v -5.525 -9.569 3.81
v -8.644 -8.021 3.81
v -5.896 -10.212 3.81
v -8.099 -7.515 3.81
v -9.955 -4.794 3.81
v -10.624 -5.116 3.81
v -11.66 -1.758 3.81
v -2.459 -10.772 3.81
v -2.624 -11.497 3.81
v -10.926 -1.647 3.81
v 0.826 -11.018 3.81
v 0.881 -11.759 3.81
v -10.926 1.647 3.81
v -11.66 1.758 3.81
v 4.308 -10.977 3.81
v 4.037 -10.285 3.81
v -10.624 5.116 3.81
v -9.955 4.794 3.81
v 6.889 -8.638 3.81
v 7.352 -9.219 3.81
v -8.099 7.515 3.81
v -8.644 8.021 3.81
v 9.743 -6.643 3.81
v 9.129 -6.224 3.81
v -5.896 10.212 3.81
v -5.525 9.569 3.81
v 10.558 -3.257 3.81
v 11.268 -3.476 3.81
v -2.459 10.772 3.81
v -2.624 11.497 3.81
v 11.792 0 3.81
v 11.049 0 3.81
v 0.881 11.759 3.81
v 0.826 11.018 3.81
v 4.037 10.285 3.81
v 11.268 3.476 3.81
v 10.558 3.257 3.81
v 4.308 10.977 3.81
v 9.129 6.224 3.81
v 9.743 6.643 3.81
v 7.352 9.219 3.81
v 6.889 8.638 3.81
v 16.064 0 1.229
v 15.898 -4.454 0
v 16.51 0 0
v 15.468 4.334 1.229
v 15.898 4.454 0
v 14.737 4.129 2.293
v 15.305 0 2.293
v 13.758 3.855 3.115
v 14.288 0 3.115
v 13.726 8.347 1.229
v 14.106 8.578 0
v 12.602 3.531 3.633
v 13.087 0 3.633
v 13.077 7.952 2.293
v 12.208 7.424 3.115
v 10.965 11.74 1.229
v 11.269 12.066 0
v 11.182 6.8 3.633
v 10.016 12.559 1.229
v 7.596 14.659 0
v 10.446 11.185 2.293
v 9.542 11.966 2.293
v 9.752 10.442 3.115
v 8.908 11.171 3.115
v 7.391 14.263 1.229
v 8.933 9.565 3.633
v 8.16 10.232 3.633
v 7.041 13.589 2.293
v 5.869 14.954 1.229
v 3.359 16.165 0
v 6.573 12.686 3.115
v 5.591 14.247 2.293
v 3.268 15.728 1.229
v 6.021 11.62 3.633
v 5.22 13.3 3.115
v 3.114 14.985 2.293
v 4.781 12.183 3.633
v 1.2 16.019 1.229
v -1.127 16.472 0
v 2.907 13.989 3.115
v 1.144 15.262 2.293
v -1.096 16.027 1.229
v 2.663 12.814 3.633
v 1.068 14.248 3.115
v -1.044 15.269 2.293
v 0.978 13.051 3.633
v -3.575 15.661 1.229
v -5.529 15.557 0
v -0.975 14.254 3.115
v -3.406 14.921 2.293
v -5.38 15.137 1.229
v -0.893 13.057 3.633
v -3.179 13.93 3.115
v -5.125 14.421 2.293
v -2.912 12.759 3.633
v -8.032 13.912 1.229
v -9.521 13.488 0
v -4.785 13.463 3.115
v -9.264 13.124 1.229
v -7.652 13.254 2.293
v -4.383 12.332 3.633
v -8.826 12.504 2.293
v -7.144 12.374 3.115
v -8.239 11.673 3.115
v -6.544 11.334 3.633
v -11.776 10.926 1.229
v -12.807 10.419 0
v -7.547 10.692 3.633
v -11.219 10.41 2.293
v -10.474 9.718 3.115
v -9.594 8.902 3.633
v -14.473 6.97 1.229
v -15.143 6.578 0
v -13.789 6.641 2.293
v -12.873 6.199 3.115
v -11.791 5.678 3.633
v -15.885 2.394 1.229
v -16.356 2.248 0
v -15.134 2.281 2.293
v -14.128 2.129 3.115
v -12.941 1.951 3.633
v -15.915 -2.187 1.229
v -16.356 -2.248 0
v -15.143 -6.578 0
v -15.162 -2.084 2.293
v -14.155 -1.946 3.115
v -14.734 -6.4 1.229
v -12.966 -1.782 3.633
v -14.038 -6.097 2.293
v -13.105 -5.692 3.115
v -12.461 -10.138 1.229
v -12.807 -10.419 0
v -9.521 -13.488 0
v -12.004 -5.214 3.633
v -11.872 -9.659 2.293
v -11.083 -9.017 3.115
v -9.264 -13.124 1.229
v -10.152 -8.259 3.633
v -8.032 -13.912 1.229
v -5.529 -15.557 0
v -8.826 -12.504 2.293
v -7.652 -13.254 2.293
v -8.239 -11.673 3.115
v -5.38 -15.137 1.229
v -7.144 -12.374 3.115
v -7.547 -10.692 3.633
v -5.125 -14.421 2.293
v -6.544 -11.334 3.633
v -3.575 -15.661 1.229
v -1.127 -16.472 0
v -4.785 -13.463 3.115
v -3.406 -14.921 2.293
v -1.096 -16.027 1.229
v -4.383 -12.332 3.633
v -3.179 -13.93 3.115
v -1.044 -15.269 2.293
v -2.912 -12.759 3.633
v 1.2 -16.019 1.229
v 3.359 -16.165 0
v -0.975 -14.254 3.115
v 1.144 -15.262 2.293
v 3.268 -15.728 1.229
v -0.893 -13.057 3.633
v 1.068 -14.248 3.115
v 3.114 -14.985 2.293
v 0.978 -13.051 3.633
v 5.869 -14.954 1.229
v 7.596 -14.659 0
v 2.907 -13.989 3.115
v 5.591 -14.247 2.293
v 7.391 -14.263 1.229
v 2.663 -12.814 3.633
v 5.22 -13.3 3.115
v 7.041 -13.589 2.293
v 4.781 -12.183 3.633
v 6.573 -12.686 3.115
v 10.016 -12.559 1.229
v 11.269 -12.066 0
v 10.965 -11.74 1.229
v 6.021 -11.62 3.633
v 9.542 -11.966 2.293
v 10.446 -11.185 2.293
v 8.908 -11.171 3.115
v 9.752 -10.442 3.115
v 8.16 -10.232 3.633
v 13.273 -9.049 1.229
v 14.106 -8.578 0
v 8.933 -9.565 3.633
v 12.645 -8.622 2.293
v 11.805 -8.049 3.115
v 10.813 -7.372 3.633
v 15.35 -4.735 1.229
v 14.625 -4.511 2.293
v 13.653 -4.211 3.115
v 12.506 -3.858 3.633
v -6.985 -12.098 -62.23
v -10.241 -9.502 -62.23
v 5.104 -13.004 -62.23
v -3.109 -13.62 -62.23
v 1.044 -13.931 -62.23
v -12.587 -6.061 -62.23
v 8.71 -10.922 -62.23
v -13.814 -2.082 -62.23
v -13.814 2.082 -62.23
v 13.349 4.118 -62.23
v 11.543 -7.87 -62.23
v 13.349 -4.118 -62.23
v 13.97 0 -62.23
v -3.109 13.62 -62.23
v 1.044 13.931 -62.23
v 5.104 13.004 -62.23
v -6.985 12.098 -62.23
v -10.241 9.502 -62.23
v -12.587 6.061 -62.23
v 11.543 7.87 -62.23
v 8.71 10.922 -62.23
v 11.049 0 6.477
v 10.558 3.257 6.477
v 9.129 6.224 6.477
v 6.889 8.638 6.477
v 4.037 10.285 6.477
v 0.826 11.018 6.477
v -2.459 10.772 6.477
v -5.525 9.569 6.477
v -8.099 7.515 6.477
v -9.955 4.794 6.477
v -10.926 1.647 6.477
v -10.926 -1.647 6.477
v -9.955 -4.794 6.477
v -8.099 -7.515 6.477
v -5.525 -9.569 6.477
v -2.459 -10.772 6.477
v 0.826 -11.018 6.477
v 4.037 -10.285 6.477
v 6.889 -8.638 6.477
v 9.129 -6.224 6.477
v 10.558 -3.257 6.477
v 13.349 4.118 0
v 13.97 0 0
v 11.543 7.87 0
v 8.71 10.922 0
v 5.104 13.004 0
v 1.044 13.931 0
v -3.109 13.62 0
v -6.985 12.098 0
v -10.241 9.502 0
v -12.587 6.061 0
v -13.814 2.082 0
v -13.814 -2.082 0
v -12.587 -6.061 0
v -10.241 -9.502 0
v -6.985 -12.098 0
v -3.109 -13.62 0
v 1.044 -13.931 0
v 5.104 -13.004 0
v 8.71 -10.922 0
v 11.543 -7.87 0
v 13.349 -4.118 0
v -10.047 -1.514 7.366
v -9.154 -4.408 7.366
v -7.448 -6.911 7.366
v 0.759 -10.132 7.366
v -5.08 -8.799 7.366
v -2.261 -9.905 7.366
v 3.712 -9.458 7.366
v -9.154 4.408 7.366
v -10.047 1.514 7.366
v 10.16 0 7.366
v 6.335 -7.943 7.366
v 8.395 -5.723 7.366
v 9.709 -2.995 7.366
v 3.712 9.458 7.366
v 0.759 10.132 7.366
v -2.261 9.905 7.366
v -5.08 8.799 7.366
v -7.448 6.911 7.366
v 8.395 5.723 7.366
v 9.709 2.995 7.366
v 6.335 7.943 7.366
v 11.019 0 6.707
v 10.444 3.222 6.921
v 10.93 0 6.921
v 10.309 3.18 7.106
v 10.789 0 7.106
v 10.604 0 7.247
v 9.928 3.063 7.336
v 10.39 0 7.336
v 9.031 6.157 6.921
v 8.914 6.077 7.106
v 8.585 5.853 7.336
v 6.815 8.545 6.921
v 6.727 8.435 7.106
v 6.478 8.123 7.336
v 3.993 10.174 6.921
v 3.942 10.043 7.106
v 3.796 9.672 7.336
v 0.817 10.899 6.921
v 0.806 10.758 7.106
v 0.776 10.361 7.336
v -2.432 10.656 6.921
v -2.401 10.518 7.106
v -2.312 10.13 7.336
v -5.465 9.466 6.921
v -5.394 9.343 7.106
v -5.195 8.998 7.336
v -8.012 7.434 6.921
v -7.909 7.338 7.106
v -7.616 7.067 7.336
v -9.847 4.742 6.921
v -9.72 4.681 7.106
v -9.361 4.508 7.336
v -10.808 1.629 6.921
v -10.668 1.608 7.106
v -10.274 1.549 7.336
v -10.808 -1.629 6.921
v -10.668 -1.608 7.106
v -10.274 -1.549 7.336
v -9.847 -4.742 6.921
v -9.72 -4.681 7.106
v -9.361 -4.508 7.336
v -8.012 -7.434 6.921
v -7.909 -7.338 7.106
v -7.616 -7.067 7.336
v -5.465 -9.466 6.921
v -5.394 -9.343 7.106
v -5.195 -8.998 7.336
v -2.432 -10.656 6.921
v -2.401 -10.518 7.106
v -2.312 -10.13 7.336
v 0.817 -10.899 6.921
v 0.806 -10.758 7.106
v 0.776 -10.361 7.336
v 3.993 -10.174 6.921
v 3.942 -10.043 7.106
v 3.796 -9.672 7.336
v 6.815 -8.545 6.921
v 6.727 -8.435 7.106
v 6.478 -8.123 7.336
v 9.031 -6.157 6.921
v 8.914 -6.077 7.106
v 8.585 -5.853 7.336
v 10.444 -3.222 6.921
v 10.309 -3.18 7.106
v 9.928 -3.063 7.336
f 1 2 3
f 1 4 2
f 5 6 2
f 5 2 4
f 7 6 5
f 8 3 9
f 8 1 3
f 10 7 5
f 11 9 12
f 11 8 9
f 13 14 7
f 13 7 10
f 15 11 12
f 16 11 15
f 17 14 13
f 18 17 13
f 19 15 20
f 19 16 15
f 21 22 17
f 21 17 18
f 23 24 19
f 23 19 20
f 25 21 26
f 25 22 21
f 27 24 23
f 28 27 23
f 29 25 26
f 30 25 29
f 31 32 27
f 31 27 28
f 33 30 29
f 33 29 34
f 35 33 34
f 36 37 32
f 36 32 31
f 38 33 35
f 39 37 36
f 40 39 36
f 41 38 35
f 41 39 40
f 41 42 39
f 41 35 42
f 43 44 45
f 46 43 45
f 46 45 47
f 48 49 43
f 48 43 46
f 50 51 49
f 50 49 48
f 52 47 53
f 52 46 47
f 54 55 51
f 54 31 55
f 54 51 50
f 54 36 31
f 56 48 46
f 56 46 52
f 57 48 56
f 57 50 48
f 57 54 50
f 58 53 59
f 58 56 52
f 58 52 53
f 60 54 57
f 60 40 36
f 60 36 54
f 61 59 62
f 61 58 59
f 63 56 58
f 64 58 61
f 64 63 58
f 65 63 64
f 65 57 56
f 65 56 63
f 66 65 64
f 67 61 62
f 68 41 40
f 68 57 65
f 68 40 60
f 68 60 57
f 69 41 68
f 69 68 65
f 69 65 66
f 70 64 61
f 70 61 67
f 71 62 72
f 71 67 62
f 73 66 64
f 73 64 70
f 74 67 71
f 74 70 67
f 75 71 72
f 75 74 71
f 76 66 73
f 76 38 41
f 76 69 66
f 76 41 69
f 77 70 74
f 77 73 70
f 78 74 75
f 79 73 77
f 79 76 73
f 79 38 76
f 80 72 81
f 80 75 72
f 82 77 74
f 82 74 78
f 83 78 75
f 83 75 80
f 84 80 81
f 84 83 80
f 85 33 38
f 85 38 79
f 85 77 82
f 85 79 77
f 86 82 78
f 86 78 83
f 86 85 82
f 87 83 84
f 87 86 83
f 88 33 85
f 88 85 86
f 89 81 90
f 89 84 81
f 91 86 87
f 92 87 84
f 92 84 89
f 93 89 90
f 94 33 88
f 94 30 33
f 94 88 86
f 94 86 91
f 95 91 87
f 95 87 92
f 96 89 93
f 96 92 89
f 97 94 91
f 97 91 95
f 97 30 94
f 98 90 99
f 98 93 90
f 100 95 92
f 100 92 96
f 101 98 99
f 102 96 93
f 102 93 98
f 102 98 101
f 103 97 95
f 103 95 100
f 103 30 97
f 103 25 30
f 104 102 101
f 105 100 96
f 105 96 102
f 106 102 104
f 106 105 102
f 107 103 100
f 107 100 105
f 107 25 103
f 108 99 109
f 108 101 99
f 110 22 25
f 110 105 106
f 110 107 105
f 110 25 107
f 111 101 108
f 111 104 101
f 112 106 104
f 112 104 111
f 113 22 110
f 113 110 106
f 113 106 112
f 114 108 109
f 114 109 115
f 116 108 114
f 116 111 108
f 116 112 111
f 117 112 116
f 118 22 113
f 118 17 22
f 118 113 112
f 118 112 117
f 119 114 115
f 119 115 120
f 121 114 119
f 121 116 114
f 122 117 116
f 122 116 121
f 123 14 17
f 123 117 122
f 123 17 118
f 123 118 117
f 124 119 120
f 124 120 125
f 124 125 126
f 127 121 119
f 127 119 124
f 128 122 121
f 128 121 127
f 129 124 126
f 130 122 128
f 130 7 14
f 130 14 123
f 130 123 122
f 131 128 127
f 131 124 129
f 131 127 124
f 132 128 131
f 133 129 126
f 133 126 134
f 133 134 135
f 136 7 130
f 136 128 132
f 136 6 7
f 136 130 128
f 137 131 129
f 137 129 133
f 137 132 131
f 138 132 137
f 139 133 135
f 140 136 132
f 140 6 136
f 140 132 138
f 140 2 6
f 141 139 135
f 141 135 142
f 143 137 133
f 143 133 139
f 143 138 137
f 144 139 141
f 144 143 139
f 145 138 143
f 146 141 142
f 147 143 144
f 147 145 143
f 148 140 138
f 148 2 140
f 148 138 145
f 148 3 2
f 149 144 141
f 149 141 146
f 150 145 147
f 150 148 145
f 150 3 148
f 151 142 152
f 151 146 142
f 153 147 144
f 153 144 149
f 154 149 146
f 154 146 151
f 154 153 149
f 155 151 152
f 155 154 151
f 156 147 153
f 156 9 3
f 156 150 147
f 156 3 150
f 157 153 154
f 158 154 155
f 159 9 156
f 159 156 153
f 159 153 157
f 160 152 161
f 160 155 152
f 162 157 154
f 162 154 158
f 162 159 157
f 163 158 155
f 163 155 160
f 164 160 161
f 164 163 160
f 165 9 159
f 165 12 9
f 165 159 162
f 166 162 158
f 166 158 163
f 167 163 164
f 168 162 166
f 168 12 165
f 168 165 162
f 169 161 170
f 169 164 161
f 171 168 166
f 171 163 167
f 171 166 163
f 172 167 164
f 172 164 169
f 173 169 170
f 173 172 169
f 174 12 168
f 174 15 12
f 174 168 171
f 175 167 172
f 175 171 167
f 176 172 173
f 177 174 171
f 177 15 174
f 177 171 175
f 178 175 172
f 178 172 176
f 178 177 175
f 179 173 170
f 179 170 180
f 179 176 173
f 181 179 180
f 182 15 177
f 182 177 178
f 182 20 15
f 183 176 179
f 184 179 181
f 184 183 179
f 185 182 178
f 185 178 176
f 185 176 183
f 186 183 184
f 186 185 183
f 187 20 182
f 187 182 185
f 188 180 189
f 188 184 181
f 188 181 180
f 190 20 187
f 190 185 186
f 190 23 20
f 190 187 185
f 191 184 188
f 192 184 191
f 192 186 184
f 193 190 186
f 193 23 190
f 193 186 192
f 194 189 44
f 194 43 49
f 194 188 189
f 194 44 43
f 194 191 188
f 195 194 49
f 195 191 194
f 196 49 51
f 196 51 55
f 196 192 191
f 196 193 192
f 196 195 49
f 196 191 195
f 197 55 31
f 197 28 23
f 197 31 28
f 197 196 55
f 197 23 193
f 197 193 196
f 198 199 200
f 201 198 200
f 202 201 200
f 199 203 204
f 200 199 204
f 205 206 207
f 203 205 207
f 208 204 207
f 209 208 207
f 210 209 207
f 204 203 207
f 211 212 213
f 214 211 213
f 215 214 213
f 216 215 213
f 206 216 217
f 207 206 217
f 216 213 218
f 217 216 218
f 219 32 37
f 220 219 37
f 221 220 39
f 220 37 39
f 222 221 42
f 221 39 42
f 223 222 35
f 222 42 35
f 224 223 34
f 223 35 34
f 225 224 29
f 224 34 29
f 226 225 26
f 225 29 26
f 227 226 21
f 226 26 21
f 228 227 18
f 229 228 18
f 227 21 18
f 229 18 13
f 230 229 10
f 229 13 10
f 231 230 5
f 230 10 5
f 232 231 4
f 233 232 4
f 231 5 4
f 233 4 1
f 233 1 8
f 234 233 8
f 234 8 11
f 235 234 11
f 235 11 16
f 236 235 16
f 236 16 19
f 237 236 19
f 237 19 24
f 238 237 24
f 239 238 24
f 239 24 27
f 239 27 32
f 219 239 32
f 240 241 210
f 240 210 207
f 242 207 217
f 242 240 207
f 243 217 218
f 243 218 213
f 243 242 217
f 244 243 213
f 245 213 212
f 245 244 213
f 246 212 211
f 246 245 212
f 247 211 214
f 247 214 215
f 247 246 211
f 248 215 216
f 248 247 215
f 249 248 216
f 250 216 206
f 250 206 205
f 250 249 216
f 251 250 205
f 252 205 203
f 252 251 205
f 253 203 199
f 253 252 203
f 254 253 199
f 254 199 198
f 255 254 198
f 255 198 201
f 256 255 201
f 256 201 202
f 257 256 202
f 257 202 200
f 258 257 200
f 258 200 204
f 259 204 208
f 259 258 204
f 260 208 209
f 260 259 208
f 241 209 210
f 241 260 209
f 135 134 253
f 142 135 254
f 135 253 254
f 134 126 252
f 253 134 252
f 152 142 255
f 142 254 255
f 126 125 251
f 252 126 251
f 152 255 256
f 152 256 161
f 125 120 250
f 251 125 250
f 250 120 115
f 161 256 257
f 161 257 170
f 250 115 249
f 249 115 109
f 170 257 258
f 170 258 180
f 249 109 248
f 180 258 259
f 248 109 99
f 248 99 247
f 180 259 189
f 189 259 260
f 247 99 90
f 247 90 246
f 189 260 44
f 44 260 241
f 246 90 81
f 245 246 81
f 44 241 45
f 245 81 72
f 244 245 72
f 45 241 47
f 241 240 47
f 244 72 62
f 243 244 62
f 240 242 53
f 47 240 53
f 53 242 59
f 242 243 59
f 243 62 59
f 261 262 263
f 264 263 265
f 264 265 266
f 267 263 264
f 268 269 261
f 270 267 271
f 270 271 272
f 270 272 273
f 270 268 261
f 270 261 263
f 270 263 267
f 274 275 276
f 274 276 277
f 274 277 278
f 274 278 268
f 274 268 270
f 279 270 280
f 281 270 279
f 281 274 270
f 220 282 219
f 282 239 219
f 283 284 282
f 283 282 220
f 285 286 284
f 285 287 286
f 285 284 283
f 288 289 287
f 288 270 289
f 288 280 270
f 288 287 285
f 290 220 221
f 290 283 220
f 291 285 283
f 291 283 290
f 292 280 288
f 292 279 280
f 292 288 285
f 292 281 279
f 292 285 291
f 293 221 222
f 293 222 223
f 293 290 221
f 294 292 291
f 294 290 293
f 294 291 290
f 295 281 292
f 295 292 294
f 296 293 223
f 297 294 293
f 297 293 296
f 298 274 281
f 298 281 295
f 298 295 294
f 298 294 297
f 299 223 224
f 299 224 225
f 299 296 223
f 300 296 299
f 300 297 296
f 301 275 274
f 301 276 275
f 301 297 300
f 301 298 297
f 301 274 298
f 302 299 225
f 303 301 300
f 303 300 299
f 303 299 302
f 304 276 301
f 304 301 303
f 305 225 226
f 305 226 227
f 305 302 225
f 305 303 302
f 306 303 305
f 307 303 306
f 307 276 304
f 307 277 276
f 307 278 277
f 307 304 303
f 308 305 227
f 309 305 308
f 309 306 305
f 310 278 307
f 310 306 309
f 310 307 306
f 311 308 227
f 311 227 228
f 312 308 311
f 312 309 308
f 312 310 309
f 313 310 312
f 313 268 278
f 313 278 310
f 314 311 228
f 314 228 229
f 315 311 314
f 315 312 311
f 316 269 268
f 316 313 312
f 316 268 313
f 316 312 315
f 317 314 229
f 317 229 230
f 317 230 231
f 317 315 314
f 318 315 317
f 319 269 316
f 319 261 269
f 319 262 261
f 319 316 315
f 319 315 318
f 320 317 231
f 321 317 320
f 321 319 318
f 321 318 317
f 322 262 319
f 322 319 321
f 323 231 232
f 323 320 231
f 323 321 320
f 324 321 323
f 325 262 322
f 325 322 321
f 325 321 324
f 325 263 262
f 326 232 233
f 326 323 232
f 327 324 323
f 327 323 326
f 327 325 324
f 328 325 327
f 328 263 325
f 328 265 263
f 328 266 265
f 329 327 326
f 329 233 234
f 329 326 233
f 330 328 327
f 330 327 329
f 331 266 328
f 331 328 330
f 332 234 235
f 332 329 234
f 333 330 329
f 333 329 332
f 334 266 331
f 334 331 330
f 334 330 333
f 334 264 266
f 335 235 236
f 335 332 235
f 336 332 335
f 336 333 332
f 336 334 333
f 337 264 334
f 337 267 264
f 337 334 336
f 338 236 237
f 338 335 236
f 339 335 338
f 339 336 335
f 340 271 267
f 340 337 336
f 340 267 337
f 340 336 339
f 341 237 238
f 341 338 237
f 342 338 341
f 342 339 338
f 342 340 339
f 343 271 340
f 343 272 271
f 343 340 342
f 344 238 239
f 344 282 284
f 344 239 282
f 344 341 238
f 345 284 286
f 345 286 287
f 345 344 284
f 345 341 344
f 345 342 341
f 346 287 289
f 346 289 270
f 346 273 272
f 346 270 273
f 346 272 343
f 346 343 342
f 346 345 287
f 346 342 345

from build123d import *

# Parameters (mm, degrees)
F0_R     = 16.51
F0_R_2   = 11.049
F1_DEPTH = 3.81
F2_DEPTH = 7.366
F4_R     = 0.889
F5_R     = 13.97
F5_R_2   = 11.049
F6_DEPTH = 62.23


# Not quite as in the source:
# - a fillet or chamfer that OpenCascade refuses, or shapes differently, is made with other operations: its cross-section is extruded or revolved along the edge and cut away or added


with BuildPart() as f1:
    # F0 (on Top) → F1 (new body)
    with BuildSketch(Plane.XY):
        Circle(F0_R)
        Circle(F0_R_2, mode=Mode.SUBTRACT)
    extrude(amount=F1_DEPTH)

    # F0 (on Top) → F2 (join)
    with BuildSketch(Plane.XY):
        Circle(F0_R_2)
    extrude(amount=F2_DEPTH)

    # F3: fillet of radius 4.826 on 1 edges, made by hand

    # F3_s1 → F3_t2 (revolve, cut)
    with BuildSketch(Plane.XZ):
        with BuildLine():
            ThreePointArc((16.51, 0), (14.8242428344, 2.7385633568), (11.7921593923, 3.81))
            Line((11.7921593923, 3.81), (16.51, 3.81))
            Line((16.51, 3.81), (16.51, 0))
        make_face()
    revolve(axis=Axis((0, 0, 3.81), (0, 0, 1)), mode=Mode.SUBTRACT)

    # F4
    f4_edges = [f1.edges().sort_by_distance(p)[0] for p in [
        (-11.049, 0, 7.366),
    ]]
    fillet(f4_edges, radius=F4_R)

    # F5 (on face) → F6 (join)
    with BuildSketch(Plane.XY):
        Circle(F5_R)
        Circle(F5_R_2, mode=Mode.SUBTRACT)
        Circle(F5_R_2)
    extrude(amount=-F6_DEPTH)


solid = f1.part
